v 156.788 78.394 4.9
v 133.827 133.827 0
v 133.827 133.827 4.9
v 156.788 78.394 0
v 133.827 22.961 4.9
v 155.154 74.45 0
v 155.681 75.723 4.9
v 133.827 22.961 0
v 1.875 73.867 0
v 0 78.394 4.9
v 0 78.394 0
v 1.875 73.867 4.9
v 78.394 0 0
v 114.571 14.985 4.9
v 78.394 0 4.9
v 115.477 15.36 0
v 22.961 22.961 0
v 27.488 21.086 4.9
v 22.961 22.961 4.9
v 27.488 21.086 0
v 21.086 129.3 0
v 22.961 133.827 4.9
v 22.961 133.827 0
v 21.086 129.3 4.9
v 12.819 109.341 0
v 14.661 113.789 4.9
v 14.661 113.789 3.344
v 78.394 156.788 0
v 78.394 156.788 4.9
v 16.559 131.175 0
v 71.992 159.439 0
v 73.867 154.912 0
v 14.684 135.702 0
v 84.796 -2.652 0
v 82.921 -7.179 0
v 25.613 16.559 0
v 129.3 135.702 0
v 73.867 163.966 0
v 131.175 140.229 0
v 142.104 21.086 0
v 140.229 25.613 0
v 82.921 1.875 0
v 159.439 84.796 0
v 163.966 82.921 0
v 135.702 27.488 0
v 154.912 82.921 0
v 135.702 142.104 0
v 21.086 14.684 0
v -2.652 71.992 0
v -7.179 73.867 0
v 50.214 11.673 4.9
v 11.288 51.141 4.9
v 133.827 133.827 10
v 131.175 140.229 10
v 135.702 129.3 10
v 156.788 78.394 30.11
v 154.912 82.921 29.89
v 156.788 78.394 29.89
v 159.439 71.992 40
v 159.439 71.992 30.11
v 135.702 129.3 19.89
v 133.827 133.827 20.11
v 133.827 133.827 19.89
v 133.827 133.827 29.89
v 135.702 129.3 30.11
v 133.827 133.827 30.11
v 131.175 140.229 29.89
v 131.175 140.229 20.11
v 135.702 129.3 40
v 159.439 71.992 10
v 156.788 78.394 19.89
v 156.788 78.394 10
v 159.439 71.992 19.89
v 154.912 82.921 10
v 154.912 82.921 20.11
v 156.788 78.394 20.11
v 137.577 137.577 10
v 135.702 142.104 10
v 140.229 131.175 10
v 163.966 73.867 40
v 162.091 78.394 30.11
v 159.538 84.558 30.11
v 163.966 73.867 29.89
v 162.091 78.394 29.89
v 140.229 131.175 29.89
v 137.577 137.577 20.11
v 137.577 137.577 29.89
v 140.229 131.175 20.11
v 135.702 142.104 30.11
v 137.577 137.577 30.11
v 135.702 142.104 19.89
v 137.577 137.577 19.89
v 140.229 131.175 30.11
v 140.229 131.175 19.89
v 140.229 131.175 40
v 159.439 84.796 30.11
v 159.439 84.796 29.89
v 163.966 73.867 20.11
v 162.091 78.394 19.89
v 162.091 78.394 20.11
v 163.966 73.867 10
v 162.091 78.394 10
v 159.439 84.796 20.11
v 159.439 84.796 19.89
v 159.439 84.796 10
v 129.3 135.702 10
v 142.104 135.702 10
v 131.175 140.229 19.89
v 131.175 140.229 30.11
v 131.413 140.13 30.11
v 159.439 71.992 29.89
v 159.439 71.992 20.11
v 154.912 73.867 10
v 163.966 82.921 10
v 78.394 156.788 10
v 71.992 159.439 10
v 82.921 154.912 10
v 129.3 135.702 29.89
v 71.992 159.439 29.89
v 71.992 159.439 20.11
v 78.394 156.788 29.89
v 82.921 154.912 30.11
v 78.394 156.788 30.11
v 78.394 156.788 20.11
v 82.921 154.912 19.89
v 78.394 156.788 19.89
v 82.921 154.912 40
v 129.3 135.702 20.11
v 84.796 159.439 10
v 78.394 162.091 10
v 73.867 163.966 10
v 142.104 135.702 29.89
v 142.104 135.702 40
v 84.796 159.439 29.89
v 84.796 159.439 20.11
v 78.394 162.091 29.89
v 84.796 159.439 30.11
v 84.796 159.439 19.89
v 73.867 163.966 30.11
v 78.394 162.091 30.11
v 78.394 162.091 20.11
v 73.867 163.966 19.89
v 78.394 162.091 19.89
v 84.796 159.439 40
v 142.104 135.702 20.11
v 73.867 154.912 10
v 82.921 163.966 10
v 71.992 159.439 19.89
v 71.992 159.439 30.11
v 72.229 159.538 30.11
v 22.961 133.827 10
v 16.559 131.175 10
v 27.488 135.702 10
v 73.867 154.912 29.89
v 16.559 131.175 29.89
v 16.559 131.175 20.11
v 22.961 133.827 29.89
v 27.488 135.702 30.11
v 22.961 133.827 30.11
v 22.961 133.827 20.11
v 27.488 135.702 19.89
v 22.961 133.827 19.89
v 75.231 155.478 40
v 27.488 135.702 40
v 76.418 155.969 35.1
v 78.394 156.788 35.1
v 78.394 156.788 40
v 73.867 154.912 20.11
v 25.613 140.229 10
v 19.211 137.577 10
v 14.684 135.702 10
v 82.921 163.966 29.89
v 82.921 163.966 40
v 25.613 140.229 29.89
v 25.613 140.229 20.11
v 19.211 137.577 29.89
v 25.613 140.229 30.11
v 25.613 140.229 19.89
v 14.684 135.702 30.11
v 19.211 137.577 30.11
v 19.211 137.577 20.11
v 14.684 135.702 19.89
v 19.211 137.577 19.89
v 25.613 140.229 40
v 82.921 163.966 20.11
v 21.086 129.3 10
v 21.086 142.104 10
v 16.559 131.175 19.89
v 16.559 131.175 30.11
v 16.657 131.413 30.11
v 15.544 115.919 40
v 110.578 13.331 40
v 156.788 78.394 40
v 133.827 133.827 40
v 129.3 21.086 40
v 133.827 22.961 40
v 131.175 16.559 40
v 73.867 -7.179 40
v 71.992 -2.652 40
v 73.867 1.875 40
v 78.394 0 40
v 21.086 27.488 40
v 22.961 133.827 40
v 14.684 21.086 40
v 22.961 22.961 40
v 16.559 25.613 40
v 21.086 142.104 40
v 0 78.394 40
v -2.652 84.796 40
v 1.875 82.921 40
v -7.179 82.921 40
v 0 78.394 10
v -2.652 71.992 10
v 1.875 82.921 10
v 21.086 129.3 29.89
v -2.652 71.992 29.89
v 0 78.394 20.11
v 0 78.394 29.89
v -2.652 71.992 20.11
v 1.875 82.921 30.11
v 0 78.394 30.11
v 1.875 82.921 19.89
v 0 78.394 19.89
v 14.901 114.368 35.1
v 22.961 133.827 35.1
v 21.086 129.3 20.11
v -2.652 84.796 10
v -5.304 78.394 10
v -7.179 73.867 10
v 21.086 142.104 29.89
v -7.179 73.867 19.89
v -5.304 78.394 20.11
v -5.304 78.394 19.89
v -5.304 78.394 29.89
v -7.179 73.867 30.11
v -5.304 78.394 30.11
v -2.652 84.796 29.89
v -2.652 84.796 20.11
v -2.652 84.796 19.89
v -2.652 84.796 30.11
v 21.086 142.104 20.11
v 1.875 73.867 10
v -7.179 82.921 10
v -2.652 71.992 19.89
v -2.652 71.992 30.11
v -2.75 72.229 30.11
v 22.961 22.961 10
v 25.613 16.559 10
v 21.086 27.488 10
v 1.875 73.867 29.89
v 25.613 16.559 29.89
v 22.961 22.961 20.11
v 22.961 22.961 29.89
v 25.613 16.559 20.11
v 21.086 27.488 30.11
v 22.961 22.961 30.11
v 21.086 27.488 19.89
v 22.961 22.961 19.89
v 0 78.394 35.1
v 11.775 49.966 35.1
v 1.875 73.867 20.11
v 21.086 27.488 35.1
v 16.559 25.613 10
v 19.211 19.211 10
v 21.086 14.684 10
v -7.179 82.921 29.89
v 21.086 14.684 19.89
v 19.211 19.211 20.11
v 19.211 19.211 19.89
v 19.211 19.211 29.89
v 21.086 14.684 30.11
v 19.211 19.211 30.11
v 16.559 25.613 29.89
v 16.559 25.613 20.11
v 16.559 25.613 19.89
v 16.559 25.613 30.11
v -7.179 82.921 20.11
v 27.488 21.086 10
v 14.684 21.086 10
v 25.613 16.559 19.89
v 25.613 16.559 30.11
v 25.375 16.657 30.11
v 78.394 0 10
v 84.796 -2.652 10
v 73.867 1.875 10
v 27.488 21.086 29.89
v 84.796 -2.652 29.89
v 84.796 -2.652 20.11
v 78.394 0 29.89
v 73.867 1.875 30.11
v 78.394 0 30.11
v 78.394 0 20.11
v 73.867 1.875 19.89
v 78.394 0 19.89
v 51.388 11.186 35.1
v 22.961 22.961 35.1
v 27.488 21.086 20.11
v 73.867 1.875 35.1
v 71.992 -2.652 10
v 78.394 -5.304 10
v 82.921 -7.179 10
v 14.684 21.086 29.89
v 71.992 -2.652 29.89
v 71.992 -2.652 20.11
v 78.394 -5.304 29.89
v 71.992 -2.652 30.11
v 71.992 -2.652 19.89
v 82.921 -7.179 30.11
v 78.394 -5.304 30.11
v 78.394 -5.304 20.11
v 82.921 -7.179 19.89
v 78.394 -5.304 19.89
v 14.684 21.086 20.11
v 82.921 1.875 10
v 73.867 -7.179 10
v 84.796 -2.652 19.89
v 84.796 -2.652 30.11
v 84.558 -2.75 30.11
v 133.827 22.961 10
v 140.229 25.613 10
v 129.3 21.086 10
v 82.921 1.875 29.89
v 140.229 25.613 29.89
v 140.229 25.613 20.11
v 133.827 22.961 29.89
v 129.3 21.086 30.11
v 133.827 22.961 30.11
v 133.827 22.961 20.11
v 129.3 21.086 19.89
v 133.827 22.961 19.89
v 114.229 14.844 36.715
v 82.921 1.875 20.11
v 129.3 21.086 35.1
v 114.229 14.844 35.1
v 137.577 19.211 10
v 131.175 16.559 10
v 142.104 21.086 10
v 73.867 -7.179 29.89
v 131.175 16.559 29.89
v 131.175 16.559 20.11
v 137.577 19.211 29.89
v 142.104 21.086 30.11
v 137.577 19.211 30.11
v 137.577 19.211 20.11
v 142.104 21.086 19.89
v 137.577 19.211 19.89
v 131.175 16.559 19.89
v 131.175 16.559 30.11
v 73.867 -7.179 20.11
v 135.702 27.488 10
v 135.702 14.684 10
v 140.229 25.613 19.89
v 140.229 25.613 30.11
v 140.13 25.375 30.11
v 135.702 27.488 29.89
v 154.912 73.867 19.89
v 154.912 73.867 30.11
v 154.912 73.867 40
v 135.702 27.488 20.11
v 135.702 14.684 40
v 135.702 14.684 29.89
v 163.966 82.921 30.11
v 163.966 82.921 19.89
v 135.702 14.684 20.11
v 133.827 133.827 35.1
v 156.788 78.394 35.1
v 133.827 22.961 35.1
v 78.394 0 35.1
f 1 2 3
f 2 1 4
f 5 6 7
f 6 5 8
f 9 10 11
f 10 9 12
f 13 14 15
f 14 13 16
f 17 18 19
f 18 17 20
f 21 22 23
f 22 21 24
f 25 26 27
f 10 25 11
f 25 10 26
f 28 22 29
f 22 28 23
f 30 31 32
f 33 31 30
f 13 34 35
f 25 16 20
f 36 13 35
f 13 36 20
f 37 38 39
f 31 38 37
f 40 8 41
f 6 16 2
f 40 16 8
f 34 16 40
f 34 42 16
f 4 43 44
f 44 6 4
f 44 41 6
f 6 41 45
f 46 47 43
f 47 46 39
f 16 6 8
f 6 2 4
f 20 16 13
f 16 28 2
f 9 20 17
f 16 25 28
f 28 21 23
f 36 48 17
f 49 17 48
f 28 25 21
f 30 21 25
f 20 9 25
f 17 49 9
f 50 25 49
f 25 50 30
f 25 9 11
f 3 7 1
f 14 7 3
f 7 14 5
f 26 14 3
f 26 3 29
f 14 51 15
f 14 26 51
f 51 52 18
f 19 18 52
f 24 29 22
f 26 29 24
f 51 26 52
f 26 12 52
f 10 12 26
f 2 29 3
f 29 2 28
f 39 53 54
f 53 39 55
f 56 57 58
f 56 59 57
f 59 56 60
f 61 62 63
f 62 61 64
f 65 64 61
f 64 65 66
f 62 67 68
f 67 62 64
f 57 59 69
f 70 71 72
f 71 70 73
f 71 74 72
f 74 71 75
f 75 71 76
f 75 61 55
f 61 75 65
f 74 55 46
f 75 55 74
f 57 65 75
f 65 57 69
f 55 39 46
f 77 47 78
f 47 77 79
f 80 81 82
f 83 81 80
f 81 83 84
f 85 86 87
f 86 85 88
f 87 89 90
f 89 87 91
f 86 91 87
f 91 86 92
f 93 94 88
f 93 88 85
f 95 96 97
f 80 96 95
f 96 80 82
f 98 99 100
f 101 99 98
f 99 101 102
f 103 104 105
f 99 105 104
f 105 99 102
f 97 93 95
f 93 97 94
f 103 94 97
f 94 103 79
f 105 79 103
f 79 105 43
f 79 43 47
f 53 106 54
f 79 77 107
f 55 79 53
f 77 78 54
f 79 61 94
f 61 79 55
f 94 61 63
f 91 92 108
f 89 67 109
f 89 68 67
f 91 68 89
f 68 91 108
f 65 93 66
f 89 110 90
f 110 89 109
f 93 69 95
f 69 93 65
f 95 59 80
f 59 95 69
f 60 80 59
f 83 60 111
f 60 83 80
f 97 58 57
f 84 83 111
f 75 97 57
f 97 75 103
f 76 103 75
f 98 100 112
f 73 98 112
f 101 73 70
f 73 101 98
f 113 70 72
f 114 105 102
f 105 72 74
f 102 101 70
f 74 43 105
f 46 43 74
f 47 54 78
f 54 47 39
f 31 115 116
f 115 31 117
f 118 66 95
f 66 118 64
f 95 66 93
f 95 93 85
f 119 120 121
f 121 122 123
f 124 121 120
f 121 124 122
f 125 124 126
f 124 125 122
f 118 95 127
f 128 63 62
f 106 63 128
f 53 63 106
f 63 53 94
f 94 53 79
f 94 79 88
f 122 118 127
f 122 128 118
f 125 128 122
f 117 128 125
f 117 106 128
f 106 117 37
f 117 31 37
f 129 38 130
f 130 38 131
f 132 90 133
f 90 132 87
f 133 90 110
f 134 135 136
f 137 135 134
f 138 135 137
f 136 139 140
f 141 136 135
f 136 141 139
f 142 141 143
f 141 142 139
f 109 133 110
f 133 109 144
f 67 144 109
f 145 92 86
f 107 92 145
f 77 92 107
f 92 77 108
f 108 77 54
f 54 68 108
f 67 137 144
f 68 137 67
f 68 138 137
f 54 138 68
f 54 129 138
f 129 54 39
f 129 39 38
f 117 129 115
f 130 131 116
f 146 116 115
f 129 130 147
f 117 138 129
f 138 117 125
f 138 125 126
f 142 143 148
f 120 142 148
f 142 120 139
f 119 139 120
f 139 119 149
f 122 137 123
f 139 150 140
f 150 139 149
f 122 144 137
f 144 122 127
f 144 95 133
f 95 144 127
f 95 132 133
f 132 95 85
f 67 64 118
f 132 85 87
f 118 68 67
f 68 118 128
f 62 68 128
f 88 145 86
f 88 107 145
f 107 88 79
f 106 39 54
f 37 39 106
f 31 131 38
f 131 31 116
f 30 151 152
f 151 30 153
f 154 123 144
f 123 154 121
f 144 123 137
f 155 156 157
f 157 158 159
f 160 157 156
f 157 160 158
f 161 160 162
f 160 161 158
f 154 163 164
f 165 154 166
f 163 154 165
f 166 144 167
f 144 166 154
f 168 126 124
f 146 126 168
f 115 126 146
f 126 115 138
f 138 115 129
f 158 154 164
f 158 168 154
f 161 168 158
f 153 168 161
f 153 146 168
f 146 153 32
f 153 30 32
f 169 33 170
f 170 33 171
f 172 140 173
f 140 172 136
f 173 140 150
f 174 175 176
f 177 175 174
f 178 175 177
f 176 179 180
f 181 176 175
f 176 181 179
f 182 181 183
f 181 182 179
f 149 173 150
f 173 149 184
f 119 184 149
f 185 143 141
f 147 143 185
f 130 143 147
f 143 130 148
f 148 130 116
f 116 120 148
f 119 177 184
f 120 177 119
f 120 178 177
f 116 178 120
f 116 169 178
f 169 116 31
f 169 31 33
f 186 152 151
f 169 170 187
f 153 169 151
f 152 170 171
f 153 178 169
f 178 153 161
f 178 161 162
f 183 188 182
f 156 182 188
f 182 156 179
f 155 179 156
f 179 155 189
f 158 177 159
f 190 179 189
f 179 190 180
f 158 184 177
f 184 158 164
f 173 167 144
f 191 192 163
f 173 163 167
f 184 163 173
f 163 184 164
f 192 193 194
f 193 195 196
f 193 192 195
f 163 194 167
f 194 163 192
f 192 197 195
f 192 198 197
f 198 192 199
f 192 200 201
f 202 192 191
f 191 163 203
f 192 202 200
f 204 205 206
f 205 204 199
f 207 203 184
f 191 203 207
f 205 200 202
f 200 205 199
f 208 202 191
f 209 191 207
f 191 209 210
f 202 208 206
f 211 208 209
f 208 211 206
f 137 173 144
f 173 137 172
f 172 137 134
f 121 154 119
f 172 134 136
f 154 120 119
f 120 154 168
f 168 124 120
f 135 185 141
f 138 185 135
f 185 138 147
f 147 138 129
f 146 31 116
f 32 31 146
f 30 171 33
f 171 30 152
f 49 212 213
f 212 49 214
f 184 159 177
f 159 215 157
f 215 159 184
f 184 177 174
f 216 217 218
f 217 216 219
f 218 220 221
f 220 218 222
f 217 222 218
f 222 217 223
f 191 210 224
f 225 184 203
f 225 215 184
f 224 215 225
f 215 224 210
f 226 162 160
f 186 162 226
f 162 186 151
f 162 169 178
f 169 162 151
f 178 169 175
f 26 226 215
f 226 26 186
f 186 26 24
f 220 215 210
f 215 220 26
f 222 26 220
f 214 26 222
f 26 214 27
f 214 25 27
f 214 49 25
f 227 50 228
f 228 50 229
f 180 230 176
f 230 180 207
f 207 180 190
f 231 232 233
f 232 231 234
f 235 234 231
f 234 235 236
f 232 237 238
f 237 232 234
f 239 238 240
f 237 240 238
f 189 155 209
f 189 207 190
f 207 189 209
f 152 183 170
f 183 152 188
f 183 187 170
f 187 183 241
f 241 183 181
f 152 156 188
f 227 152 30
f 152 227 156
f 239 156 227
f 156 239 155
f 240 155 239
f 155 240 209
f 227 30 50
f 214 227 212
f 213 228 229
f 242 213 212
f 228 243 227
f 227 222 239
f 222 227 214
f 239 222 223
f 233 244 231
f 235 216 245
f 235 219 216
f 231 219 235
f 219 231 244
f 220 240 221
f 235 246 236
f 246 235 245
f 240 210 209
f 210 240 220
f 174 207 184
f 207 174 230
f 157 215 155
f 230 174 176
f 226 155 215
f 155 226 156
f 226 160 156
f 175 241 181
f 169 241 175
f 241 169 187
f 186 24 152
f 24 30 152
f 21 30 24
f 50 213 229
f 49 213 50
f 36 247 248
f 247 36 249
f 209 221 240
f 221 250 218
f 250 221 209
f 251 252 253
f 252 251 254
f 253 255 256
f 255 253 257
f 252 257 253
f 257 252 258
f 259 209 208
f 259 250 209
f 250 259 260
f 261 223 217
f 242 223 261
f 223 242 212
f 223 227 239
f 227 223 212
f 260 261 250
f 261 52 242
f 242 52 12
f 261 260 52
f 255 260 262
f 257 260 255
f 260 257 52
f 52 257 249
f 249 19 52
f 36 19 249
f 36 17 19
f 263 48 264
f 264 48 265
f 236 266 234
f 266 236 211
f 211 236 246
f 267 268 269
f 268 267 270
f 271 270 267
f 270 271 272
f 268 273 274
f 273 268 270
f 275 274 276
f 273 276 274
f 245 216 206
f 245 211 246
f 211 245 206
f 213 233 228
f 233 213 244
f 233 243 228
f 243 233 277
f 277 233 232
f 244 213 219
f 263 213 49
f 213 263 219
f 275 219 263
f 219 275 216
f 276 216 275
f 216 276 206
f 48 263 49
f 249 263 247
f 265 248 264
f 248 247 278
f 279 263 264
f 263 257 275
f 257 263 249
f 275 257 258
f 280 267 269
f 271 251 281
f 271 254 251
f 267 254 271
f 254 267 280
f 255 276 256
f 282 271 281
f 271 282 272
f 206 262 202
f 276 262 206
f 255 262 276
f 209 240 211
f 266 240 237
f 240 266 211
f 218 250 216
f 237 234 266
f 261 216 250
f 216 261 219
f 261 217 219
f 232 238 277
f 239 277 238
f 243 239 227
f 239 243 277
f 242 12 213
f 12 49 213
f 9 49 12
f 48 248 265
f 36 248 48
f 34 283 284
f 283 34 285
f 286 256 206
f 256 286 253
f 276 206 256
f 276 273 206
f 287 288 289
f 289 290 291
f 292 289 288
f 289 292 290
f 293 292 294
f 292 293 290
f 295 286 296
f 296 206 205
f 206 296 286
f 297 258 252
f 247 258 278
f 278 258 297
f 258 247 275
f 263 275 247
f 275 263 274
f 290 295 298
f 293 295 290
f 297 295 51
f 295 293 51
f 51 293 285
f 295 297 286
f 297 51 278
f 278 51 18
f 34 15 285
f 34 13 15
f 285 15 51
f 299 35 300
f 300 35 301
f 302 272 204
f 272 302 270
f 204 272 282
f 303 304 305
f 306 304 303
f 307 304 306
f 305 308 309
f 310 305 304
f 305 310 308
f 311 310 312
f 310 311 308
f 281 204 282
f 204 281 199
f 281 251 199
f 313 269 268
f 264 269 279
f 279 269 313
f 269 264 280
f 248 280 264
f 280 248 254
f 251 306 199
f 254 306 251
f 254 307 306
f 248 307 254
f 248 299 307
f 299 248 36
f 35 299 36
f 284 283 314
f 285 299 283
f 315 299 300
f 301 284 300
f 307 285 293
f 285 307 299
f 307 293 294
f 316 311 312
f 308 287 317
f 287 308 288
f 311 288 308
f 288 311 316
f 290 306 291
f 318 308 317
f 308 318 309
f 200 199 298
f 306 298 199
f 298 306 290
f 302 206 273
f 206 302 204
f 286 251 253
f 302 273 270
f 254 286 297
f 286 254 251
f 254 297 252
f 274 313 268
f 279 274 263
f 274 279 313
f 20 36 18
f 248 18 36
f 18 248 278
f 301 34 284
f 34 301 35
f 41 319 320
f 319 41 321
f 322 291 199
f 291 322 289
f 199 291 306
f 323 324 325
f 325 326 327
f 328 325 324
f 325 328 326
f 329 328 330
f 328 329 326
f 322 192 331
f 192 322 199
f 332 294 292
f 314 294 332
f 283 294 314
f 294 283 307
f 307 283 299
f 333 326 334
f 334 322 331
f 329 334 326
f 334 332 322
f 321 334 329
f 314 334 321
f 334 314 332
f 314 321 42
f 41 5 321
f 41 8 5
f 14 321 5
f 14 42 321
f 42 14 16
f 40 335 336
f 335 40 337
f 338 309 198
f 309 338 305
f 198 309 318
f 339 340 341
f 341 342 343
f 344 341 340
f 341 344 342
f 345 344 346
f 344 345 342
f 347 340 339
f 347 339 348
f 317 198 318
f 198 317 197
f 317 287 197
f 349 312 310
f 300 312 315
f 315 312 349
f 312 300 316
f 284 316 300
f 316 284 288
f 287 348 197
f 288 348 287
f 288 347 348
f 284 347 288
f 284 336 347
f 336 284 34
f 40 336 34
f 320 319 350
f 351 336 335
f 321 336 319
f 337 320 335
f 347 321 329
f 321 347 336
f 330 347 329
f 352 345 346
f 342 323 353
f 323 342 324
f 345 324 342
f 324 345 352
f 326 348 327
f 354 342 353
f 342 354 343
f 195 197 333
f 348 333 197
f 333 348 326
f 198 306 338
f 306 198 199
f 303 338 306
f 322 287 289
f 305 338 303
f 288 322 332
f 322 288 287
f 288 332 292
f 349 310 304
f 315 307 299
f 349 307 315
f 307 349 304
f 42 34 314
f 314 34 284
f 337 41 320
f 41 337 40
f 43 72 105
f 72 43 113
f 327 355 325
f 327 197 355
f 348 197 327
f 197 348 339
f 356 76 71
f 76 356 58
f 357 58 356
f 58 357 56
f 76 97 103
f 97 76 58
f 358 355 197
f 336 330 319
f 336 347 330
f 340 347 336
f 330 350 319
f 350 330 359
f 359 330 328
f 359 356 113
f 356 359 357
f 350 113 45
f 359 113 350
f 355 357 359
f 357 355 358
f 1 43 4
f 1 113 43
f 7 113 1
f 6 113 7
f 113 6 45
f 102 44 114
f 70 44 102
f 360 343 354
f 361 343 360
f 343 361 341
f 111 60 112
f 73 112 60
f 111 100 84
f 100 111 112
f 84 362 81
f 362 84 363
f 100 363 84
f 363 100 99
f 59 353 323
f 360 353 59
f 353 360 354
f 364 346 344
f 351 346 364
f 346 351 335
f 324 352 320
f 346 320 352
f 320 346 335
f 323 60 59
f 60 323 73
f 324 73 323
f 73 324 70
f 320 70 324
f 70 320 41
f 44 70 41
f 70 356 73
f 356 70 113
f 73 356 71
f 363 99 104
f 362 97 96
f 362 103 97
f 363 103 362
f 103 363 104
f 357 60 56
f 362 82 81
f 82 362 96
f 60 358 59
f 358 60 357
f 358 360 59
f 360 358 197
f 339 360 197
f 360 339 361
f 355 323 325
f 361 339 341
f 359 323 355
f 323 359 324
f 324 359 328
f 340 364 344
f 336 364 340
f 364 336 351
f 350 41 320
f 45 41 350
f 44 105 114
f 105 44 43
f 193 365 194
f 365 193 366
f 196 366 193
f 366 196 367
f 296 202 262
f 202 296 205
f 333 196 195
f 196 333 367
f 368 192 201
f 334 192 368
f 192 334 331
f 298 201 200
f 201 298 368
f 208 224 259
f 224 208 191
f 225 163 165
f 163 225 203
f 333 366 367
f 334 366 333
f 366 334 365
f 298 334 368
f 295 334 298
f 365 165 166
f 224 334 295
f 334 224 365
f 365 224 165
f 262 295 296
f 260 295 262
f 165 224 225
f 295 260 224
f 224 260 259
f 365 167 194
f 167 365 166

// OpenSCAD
union() {
	union() {
		linear_extrude(height = 4.9000000000) {
			union() {
				difference() {
					polygon(points = [[156.7875557852, 78.3937778926], [133.8265498433, 133.8265498433], [78.3937778926, 156.7875557852], [22.9610059419, 133.8265498433], [0.0000000000, 78.3937778926], [22.9610059419, 22.9610059419], [78.3937778926, 0.0000000000], [133.8265498433, 22.9610059419], [156.7875557852, 78.3937778926]]);
				}
			}
		}
	}
	union() {
		color(alpha = 1.0000000000, c = [0.8000000000, 0.7000000000, 0.2000000000]) {
			translate(v = [159.4394166759, 71.9916193647, 0]) {
				rotate(a = 112.5000000000, v = [0, 0, 1]) {
					rotate(a = 90, v = [1, 0, 0]) {
						linear_extrude(height = 4.9000000000) {
							union() {
								difference() {
									polygon(points = [[62.0296464556, 40.0000000000], [62.0296464556, 30.1100000000], [73.8592929113, 30.1100000000], [73.8592929113, 19.8900000000], [62.0296464556, 19.8900000000], [62.0296464556, 10.0000000000], [73.8592929113, 10.0000000000], [73.8592929113, 0.0000000000], [11.8296464556, 0.0000000000], [11.8296464556, 10.0000000000], [0.0000000000, 10.0000000000], [0.0000000000, 20.1100000000], [11.8296464556, 20.1100000000], [11.8296464556, 29.8900000000], [0.0000000000, 29.8900000000], [0.0000000000, 40.0000000000], [62.0296464556, 40.0000000000]]);
								}
							}
						}
					}
				}
			}
		}
	}
	union() {
		color(alpha = 1.0000000000, c = [0.7000000000, 0.4000000000, 0.1000000000]) {
			translate(v = [140.2287083712, 131.1746889525, 0]) {
				rotate(a = 157.5000000000, v = [0, 0, 1]) {
					rotate(a = 90, v = [1, 0, 0]) {
						linear_extrude(height = 4.9000000000) {
							union() {
								difference() {
									polygon(points = [[62.0296464556, 40.0000000000], [62.0296464556, 30.1100000000], [73.8592929113, 30.1100000000], [73.8592929113, 19.8900000000], [62.0296464556, 19.8900000000], [62.0296464556, 10.0000000000], [73.8592929113, 10.0000000000], [73.8592929113, 0.0000000000], [11.8296464556, 0.0000000000], [11.8296464556, 10.0000000000], [0.0000000000, 10.0000000000], [0.0000000000, 20.1100000000], [11.8296464556, 20.1100000000], [11.8296464556, 29.8900000000], [0.0000000000, 29.8900000000], [0.0000000000, 40.0000000000], [62.0296464556, 40.0000000000]]);
								}
							}
						}
					}
				}
			}
		}
	}
	union() {
		color(alpha = 1.0000000000, c = [0.8000000000, 0.7000000000, 0.2000000000]) {
			translate(v = [84.7959364205, 159.4394166759, 0]) {
				rotate(a = -157.5000000000, v = [0, 0, 1]) {
					rotate(a = 90, v = [1, 0, 0]) {
						linear_extrude(height = 4.9000000000) {
							union() {
								difference() {
									polygon(points = [[62.0296464556, 40.0000000000], [62.0296464556, 30.1100000000], [73.8592929113, 30.1100000000], [73.8592929113, 19.8900000000], [62.0296464556, 19.8900000000], [62.0296464556, 10.0000000000], [73.8592929113, 10.0000000000], [73.8592929113, 0.0000000000], [11.8296464556, 0.0000000000], [11.8296464556, 10.0000000000], [0.0000000000, 10.0000000000], [0.0000000000, 20.1100000000], [11.8296464556, 20.1100000000], [11.8296464556, 29.8900000000], [0.0000000000, 29.8900000000], [0.0000000000, 40.0000000000], [62.0296464556, 40.0000000000]]);
								}
							}
						}
					}
				}
			}
		}
	}
	union() {
		color(alpha = 1.0000000000, c = [0.7000000000, 0.4000000000, 0.1000000000]) {
			translate(v = [25.6128668326, 140.2287083712, 0]) {
				rotate(a = -112.5000000000, v = [0, 0, 1]) {
					rotate(a = 90, v = [1, 0, 0]) {
						linear_extrude(height = 4.9000000000) {
							union() {
								difference() {
									polygon(points = [[62.0296464556, 40.0000000000], [62.0296464556, 30.1100000000], [73.8592929113, 30.1100000000], [73.8592929113, 19.8900000000], [62.0296464556, 19.8900000000], [62.0296464556, 10.0000000000], [73.8592929113, 10.0000000000], [73.8592929113, 0.0000000000], [11.8296464556, 0.0000000000], [11.8296464556, 10.0000000000], [0.0000000000, 10.0000000000], [0.0000000000, 20.1100000000], [11.8296464556, 20.1100000000], [11.8296464556, 29.8900000000], [0.0000000000, 29.8900000000], [0.0000000000, 40.0000000000], [62.0296464556, 40.0000000000]]);
								}
							}
						}
					}
				}
			}
		}
	}
	union() {
		color(alpha = 1.0000000000, c = [0.8000000000, 0.7000000000, 0.2000000000]) {
			translate(v = [-2.6518608907, 84.7959364205, 0]) {
				rotate(a = -67.5000000000, v = [0, 0, 1]) {
					rotate(a = 90, v = [1, 0, 0]) {
						linear_extrude(height = 4.9000000000) {
							union() {
								difference() {
									polygon(points = [[62.0296464556, 40.0000000000], [62.0296464556, 30.1100000000], [73.8592929113, 30.1100000000], [73.8592929113, 19.8900000000], [62.0296464556, 19.8900000000], [62.0296464556, 10.0000000000], [73.8592929113, 10.0000000000], [73.8592929113, 0.0000000000], [11.8296464556, 0.0000000000], [11.8296464556, 10.0000000000], [0.0000000000, 10.0000000000], [0.0000000000, 20.1100000000], [11.8296464556, 20.1100000000], [11.8296464556, 29.8900000000], [0.0000000000, 29.8900000000], [0.0000000000, 40.0000000000], [62.0296464556, 40.0000000000]]);
								}
							}
						}
					}
				}
			}
		}
	}
	union() {
		color(alpha = 1.0000000000, c = [0.7000000000, 0.4000000000, 0.1000000000]) {
			translate(v = [16.5588474140, 25.6128668326, 0]) {
				rotate(a = -22.5000000000, v = [0, 0, 1]) {
					rotate(a = 90, v = [1, 0, 0]) {
						linear_extrude(height = 4.9000000000) {
							union() {
								difference() {
									polygon(points = [[62.0296464556, 40.0000000000], [62.0296464556, 30.1100000000], [73.8592929113, 30.1100000000], [73.8592929113, 19.8900000000], [62.0296464556, 19.8900000000], [62.0296464556, 10.0000000000], [73.8592929113, 10.0000000000], [73.8592929113, 0.0000000000], [11.8296464556, 0.0000000000], [11.8296464556, 10.0000000000], [0.0000000000, 10.0000000000], [0.0000000000, 20.1100000000], [11.8296464556, 20.1100000000], [11.8296464556, 29.8900000000], [0.0000000000, 29.8900000000], [0.0000000000, 40.0000000000], [62.0296464556, 40.0000000000]]);
								}
							}
						}
					}
				}
			}
		}
	}
	union() {
		color(alpha = 1.0000000000, c = [0.8000000000, 0.7000000000, 0.2000000000]) {
			translate(v = [71.9916193647, -2.6518608907, 0]) {
				rotate(a = 22.5000000000, v = [0, 0, 1]) {
					rotate(a = 90, v = [1, 0, 0]) {
						linear_extrude(height = 4.9000000000) {
							union() {
								difference() {
									polygon(points = [[62.0296464556, 40.0000000000], [62.0296464556, 30.1100000000], [73.8592929113, 30.1100000000], [73.8592929113, 19.8900000000], [62.0296464556, 19.8900000000], [62.0296464556, 10.0000000000], [73.8592929113, 10.0000000000], [73.8592929113, 0.0000000000], [11.8296464556, 0.0000000000], [11.8296464556, 10.0000000000], [0.0000000000, 10.0000000000], [0.0000000000, 20.1100000000], [11.8296464556, 20.1100000000], [11.8296464556, 29.8900000000], [0.0000000000, 29.8900000000], [0.0000000000, 40.0000000000], [62.0296464556, 40.0000000000]]);
								}
							}
						}
					}
				}
			}
		}
	}
	union() {
		color(alpha = 1.0000000000, c = [0.7000000000, 0.4000000000, 0.1000000000]) {
			translate(v = [131.1746889525, 16.5588474140, 0]) {
				rotate(a = 67.5000000000, v = [0, 0, 1]) {
					rotate(a = 90, v = [1, 0, 0]) {
						linear_extrude(height = 4.9000000000) {
							union() {
								difference() {
									polygon(points = [[62.0296464556, 40.0000000000], [62.0296464556, 30.1100000000], [73.8592929113, 30.1100000000], [73.8592929113, 19.8900000000], [62.0296464556, 19.8900000000], [62.0296464556, 10.0000000000], [73.8592929113, 10.0000000000], [73.8592929113, 0.0000000000], [11.8296464556, 0.0000000000], [11.8296464556, 10.0000000000], [0.0000000000, 10.0000000000], [0.0000000000, 20.1100000000], [11.8296464556, 20.1100000000], [11.8296464556, 29.8900000000], [0.0000000000, 29.8900000000], [0.0000000000, 40.0000000000], [62.0296464556, 40.0000000000]]);
								}
							}
						}
					}
				}
			}
		}
	}
	union() {
		translate(v = [0, 0, 35.1000000000]) {
			linear_extrude(height = 4.9000000000) {
				union() {
					difference() {
						polygon(points = [[156.7875557852, 78.3937778926], [133.8265498433, 133.8265498433], [78.3937778926, 156.7875557852], [22.9610059419, 133.8265498433], [0.0000000000, 78.3937778926], [22.9610059419, 22.9610059419], [78.3937778926, 0.0000000000], [133.8265498433, 22.9610059419], [156.7875557852, 78.3937778926]]);
					}
				}
			}
		}
	}
}
